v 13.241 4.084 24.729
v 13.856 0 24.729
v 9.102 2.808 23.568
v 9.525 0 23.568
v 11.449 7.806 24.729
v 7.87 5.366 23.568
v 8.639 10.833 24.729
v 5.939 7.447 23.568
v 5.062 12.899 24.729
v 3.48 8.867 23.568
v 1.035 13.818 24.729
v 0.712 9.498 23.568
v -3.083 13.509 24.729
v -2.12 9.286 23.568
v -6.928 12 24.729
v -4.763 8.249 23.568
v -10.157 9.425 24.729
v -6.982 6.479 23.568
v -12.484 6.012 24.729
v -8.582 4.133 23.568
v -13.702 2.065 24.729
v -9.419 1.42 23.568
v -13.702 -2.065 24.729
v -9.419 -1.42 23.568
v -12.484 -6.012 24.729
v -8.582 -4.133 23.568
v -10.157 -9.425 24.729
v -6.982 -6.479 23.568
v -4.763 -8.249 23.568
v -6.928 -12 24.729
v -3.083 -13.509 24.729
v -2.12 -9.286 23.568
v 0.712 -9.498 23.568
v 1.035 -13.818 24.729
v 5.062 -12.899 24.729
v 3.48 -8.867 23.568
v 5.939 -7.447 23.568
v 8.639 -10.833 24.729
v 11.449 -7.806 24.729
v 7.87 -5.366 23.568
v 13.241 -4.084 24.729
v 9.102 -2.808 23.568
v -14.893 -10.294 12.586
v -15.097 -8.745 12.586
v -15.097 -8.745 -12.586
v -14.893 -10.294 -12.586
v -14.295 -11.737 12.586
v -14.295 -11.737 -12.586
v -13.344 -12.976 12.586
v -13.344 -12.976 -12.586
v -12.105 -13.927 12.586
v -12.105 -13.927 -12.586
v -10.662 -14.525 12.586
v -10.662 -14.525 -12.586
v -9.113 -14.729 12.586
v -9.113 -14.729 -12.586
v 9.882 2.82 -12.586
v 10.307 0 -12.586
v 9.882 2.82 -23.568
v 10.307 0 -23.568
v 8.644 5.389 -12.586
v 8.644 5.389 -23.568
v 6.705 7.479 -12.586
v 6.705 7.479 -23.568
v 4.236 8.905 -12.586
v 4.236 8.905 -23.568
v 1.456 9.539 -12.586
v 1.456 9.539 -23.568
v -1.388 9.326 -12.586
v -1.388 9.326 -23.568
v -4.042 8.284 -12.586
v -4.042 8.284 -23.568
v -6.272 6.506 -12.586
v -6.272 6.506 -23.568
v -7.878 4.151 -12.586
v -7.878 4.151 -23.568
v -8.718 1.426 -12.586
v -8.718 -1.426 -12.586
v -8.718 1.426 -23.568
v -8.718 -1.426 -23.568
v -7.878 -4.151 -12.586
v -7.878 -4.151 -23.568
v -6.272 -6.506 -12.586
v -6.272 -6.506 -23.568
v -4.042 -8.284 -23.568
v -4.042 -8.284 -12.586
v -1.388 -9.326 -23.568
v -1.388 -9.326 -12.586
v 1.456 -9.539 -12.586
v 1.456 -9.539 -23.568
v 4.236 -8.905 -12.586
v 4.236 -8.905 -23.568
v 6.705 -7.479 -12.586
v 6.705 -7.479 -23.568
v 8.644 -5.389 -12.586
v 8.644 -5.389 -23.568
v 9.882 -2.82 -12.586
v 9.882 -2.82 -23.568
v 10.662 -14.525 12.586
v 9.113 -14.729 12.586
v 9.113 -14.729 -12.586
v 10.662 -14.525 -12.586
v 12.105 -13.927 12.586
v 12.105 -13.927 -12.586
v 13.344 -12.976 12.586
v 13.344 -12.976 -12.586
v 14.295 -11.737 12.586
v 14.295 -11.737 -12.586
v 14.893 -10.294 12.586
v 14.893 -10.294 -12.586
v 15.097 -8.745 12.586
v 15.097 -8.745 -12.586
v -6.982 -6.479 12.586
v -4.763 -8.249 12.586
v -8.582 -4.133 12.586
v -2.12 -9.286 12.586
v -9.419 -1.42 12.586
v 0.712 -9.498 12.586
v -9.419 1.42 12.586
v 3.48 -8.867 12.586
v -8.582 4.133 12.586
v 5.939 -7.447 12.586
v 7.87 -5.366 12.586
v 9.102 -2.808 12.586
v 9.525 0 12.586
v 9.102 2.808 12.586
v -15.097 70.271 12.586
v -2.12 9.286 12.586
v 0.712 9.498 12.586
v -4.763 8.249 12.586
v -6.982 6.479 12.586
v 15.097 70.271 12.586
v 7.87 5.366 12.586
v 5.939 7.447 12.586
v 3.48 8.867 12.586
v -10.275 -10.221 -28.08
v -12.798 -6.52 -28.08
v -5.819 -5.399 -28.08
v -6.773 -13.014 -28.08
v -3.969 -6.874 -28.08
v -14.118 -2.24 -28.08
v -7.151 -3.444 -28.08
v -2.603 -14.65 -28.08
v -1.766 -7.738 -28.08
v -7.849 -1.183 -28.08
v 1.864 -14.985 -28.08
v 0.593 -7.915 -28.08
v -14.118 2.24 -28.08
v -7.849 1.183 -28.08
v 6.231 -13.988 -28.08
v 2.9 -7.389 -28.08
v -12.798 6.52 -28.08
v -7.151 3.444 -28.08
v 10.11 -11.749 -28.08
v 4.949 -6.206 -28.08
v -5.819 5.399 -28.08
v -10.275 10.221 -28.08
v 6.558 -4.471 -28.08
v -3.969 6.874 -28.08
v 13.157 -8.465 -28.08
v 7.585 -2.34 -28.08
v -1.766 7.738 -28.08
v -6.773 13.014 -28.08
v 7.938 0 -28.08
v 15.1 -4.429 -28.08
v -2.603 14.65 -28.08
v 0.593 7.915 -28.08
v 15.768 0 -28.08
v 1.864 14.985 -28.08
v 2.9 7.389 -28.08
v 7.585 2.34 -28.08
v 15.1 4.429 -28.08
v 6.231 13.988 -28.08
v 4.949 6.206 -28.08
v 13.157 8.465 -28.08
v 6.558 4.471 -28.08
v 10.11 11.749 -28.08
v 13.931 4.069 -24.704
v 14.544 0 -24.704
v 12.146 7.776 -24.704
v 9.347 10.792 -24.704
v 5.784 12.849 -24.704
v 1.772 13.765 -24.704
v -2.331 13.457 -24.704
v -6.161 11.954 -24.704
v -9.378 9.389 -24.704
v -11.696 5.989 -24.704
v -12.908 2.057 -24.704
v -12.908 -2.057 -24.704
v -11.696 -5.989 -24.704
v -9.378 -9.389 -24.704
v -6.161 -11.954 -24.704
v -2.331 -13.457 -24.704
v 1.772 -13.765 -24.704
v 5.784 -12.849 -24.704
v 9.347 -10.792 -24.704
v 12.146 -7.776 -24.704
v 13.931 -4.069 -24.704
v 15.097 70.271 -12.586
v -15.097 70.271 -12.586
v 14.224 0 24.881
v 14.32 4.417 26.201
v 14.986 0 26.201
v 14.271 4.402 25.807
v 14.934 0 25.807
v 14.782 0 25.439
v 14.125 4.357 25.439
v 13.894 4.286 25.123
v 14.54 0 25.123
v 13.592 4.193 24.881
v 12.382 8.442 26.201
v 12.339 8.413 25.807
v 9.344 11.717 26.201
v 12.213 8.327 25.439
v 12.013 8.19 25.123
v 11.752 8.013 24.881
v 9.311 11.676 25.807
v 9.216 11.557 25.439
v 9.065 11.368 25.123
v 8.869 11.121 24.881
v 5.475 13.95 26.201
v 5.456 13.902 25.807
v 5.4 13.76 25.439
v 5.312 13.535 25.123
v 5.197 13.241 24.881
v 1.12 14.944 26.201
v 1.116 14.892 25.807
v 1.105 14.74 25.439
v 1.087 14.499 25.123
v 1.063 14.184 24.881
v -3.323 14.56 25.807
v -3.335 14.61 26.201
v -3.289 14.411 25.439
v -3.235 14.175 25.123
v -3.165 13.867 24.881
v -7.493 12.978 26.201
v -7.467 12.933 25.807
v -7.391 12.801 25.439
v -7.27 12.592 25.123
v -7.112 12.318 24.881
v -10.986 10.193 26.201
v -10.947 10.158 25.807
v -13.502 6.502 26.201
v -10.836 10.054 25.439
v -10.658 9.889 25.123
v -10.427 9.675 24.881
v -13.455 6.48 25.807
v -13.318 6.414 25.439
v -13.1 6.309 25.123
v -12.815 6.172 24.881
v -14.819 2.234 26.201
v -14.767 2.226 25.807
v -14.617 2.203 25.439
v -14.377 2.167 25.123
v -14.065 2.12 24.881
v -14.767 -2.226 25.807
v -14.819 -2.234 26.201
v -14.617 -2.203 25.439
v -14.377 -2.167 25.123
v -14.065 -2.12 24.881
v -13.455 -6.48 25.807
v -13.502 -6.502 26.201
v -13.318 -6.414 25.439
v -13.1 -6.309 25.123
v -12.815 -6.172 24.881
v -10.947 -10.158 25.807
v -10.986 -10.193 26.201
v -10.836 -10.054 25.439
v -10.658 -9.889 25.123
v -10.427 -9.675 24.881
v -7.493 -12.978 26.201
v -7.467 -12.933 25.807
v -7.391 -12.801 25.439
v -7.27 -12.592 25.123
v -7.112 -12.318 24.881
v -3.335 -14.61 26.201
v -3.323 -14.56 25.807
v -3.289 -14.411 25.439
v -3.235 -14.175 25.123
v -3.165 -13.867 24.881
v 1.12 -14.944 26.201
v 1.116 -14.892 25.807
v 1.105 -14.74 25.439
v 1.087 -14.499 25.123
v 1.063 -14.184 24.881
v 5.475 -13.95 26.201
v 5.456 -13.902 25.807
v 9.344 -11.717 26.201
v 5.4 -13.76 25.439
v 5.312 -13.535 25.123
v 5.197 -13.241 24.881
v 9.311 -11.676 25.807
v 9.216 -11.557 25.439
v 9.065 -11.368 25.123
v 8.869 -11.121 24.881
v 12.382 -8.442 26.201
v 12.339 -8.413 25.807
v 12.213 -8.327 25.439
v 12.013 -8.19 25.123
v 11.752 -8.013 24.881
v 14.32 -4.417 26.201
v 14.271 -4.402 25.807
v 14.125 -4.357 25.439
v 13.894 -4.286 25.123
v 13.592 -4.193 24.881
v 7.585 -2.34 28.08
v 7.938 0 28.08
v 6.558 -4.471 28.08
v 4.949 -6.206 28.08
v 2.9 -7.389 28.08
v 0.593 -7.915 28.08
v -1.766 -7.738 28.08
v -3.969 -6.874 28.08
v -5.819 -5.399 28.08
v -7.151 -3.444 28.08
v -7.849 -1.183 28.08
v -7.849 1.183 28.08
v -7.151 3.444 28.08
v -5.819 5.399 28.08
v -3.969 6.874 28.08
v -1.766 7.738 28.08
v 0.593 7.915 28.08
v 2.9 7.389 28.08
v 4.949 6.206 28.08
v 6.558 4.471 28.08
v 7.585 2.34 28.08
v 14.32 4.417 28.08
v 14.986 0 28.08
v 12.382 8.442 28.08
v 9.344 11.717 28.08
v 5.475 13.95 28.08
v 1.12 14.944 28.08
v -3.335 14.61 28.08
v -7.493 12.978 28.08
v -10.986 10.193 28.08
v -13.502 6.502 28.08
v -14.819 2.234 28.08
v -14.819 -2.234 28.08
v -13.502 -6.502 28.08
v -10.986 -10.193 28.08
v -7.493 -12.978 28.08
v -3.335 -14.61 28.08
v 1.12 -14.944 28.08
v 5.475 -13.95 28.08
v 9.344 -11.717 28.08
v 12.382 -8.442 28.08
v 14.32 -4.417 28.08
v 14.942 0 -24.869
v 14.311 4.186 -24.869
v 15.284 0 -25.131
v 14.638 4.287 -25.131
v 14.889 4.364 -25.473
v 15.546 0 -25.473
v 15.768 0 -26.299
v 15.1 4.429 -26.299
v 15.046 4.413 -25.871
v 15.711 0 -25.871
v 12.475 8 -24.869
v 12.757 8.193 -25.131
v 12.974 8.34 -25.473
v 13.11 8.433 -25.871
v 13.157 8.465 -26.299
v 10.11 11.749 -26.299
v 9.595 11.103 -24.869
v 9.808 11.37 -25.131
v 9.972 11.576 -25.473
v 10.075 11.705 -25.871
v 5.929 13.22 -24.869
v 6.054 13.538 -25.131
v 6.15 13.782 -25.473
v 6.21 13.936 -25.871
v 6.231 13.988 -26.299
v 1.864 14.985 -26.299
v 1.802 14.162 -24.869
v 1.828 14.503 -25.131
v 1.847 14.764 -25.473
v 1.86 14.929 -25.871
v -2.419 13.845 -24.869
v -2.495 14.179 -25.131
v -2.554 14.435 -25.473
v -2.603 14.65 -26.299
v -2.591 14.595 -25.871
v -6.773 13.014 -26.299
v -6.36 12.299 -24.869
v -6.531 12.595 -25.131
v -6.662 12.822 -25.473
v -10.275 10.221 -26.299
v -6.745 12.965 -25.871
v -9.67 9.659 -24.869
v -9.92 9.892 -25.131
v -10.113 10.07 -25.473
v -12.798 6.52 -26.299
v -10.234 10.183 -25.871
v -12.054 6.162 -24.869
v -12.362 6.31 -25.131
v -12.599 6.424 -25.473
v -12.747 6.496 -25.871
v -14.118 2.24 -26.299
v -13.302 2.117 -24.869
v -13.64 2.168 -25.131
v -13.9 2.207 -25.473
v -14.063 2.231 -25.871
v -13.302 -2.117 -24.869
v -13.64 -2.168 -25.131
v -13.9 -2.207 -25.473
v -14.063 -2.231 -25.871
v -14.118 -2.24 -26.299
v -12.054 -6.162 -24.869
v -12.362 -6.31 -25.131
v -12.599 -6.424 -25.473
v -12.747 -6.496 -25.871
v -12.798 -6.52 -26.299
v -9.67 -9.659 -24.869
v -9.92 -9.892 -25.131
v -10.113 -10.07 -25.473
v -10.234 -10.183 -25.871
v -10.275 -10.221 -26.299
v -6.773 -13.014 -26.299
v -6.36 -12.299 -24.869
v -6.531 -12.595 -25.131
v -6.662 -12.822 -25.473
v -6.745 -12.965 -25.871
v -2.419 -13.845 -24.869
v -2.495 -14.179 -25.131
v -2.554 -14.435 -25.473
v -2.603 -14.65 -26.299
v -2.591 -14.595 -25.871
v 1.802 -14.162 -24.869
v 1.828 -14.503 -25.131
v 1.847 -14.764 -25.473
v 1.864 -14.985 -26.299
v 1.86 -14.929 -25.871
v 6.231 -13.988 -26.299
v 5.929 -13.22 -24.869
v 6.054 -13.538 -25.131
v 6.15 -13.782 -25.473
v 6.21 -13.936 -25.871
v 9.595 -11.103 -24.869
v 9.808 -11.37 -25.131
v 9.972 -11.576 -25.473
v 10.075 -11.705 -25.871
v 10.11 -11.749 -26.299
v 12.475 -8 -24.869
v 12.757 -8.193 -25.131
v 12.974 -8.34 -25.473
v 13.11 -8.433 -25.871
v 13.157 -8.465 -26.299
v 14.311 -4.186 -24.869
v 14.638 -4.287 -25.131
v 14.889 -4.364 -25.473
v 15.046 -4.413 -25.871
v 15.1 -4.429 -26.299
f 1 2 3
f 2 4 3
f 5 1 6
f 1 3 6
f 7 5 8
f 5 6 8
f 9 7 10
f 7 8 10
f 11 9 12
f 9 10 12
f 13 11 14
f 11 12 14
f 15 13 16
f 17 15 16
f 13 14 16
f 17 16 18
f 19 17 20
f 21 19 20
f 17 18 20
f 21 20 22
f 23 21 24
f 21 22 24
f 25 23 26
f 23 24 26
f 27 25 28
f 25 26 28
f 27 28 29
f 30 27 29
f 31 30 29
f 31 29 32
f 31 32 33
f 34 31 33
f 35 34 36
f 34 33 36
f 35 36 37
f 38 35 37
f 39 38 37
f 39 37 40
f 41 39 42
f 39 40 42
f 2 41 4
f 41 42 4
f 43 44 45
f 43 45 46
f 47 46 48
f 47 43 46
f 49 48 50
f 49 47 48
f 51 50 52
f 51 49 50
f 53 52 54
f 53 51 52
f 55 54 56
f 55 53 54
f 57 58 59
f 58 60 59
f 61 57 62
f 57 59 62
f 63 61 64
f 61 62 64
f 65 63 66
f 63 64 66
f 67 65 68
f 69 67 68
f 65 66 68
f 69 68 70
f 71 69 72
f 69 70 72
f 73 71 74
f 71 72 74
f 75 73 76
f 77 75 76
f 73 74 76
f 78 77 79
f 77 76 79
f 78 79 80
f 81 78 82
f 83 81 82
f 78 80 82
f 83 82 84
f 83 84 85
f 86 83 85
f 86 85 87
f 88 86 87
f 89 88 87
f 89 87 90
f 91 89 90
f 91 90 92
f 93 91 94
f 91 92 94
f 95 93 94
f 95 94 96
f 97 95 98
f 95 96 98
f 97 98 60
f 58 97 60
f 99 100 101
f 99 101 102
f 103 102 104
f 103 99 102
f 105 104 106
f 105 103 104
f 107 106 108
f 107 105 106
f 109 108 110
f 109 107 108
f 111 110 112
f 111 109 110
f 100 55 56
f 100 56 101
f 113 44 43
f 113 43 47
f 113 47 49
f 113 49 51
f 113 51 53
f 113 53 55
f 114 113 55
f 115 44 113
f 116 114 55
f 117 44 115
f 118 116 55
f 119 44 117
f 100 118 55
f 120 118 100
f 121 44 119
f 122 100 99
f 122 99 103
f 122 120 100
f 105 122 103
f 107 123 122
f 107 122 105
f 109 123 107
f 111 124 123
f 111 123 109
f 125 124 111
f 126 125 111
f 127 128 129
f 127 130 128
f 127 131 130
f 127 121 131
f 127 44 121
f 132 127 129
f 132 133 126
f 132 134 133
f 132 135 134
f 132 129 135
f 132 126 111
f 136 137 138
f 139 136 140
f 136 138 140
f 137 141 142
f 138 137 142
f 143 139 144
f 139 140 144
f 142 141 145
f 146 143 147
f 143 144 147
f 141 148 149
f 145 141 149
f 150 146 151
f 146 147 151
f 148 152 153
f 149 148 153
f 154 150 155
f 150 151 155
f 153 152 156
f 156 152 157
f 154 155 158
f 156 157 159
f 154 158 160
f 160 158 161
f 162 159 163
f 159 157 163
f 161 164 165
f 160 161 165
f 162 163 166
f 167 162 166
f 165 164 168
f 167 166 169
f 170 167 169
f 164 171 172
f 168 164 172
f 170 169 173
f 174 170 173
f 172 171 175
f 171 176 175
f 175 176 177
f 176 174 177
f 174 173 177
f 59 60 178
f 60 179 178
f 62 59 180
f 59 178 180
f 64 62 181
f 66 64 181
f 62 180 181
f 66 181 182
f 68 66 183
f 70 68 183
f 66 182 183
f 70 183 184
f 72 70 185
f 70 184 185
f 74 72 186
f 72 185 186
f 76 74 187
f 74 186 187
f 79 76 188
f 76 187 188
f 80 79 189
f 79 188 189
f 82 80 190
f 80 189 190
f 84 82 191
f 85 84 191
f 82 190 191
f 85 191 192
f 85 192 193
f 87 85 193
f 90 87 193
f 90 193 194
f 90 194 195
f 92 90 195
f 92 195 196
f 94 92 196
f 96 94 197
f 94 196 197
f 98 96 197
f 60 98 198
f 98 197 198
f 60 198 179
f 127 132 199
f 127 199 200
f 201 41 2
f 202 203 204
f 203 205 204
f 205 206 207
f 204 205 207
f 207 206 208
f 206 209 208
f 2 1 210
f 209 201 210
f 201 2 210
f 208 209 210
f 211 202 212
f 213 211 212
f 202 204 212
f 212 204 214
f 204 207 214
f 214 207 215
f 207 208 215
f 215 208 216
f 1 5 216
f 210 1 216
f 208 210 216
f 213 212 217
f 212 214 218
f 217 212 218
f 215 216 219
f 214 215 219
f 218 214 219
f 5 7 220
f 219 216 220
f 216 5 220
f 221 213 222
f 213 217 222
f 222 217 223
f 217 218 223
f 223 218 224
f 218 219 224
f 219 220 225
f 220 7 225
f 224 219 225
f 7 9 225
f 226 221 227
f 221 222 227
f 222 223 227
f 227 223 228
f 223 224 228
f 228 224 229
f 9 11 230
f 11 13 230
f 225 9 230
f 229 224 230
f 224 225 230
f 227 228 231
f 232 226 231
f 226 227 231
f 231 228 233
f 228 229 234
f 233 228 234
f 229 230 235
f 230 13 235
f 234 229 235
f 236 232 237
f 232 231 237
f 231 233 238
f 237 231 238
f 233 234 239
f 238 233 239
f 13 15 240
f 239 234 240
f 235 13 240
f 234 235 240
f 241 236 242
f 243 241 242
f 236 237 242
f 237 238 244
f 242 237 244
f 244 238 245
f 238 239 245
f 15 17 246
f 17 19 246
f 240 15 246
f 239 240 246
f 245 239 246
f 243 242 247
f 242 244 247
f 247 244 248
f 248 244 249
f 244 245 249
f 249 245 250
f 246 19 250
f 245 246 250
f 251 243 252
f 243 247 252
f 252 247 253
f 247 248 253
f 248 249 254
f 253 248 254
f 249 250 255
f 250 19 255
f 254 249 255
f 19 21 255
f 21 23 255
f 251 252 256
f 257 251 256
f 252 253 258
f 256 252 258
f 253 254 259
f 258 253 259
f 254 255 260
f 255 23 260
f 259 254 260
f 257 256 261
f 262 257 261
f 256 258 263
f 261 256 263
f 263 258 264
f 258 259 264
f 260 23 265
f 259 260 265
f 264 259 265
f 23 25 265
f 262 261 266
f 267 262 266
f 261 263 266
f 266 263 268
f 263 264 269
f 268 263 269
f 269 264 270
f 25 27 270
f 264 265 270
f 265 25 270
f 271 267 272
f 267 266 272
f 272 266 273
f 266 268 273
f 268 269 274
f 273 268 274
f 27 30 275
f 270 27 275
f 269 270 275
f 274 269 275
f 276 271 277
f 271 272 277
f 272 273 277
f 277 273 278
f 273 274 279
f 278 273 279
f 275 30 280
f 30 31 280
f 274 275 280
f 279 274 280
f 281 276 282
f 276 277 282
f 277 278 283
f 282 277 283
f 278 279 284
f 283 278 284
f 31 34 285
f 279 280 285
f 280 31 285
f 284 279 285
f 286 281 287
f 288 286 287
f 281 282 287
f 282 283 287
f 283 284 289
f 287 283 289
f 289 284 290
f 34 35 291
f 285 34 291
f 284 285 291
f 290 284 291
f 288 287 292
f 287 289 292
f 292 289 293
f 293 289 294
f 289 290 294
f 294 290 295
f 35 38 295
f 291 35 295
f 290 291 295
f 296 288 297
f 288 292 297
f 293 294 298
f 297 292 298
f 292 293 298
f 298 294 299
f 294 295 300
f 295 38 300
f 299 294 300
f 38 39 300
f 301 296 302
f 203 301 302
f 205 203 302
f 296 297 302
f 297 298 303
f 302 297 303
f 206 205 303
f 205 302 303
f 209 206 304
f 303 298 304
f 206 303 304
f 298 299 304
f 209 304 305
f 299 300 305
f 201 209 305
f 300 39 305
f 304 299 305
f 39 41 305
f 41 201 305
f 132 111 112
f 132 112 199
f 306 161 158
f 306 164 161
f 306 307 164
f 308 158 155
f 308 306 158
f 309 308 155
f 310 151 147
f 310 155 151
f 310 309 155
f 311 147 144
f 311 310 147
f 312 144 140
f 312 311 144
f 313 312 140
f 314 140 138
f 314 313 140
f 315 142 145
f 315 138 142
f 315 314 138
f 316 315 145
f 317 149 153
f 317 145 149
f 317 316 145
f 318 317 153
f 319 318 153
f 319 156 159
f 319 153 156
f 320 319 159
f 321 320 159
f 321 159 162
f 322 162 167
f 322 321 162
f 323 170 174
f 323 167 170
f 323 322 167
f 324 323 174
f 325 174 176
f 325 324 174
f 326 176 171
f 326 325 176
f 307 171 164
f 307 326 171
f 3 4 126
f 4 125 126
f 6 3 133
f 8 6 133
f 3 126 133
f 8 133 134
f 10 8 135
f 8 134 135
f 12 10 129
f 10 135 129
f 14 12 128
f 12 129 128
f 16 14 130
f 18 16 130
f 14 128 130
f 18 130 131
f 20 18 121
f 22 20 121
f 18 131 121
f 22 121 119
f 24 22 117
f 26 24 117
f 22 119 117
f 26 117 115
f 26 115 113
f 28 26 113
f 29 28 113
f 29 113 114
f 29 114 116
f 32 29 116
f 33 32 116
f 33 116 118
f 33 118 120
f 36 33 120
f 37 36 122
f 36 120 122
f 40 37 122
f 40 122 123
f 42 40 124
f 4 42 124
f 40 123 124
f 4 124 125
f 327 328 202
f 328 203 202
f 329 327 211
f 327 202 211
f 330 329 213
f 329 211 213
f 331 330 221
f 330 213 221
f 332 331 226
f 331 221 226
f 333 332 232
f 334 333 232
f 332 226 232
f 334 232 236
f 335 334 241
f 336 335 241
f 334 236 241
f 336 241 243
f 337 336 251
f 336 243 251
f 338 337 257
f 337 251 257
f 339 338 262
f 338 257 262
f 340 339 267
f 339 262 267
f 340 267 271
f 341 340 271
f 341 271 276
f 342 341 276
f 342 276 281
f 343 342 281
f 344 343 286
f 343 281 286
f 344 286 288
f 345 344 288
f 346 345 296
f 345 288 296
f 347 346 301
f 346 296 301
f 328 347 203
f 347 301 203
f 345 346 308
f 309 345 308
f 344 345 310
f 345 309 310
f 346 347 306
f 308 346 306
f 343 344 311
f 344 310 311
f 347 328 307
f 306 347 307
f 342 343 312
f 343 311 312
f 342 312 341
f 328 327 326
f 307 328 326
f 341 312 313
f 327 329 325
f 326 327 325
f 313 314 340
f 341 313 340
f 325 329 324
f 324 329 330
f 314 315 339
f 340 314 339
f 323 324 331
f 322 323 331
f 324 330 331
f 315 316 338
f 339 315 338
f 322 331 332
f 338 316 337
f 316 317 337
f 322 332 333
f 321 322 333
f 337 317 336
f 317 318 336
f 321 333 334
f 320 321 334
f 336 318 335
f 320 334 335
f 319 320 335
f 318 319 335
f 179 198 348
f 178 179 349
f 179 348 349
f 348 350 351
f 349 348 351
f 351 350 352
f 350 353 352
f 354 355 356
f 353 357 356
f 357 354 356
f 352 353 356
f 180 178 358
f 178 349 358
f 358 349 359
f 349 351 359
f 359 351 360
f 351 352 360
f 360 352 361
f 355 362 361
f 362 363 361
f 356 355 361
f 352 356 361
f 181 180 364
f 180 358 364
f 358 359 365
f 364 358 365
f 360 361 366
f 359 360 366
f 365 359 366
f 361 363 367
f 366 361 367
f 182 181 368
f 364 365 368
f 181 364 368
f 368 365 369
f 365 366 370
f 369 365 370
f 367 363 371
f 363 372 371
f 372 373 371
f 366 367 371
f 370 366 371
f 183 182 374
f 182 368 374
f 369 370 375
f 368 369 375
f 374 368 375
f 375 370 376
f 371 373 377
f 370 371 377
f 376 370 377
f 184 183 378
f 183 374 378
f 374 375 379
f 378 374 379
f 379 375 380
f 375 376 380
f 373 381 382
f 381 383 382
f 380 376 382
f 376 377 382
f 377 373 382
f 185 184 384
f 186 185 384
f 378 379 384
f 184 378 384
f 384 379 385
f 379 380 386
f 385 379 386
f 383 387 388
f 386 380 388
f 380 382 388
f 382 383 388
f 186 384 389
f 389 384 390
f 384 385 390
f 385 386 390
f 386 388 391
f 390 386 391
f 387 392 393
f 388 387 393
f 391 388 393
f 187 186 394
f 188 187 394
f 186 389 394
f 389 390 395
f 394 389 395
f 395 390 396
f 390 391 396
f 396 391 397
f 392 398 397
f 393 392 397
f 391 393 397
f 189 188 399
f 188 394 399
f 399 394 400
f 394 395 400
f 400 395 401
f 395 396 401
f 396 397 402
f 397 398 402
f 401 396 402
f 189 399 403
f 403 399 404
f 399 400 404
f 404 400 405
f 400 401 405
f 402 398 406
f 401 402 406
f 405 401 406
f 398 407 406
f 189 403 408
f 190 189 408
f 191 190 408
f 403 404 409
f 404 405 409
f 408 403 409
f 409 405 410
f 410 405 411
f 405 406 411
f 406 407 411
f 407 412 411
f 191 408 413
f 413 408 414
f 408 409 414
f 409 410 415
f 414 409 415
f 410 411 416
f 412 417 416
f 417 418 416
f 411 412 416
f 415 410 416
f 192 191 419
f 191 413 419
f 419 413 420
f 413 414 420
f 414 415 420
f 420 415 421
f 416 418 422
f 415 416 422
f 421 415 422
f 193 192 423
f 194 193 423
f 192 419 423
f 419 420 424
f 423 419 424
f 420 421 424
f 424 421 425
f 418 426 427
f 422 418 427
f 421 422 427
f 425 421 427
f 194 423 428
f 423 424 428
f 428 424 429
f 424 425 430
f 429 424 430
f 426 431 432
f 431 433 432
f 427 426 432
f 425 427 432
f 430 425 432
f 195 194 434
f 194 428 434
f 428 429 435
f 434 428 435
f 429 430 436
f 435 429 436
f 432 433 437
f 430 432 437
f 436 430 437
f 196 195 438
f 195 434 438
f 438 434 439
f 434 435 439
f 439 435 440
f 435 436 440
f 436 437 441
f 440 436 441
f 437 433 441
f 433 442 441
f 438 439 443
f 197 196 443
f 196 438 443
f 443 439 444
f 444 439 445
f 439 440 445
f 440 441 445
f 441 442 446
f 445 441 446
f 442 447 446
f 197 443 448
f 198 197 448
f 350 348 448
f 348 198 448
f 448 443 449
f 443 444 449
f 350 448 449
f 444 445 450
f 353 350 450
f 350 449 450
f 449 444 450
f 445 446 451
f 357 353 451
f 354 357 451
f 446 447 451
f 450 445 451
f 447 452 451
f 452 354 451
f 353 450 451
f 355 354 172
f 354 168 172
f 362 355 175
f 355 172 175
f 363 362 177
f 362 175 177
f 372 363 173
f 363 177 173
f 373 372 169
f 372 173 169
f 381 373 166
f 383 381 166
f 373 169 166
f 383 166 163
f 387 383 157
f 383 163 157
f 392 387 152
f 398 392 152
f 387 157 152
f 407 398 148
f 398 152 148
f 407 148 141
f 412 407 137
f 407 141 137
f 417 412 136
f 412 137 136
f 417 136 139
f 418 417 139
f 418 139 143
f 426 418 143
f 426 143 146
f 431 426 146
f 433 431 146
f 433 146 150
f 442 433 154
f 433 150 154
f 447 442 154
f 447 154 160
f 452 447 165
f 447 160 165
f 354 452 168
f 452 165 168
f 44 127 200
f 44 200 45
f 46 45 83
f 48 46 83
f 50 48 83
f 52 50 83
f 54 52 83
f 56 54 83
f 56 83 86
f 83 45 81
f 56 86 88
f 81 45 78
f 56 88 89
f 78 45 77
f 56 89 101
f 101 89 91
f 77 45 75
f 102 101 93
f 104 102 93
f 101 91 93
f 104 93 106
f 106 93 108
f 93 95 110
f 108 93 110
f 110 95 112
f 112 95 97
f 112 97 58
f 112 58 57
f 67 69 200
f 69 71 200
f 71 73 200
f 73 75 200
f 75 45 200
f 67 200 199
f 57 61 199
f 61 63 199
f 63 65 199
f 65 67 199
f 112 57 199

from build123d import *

# Parameters (mm, degrees)
BOSS_EXTRUDE1_DEPTH = 25.1714


with BuildPart() as part:
    # Sketch1 → Boss-Extrude1 (new body)
    with BuildSketch(Plane.XY.offset(12.5857)):
        with BuildLine():
            Line((-15.096819971, 70.27139515), (-15.096819971, -8.74510913))
            ThreePointArc((-15.096819971, -8.74510913), (-13.34429465, -12.976079529), (-9.113324251, -14.72860485))
            Line((-9.113324251, -14.72860485), (9.113324251, -14.72860485))
            ThreePointArc((9.113324251, -14.72860485), (13.34429465, -12.976079529), (15.096819971, -8.74510913))
            Line((15.096819971, -8.74510913), (15.096819971, 70.27139515))
            Line((15.096819971, 70.27139515), (-15.096819971, 70.27139515))
        make_face()
    extrude(amount=-BOSS_EXTRUDE1_DEPTH)

    # Sketch2 → Revolve1 (revolve)
    with BuildSketch(Plane(origin=(0, 0, 0), x_dir=(1, 0, 0), z_dir=(0, 1, 0))):
        with BuildLine():
            Line((15.767676296, 28.0797), (0.740743286, 28.0797))
            Line((0.740743286, 28.0797), (0.740743286, 12.5857))
            Line((0.740743286, 12.5857), (10.306676296, 12.5857))
            Line((10.306676296, 12.5857), (10.306676296, 23.56842946))
            Line((10.306676296, 23.56842946), (14.543986539, 24.703813318))
            ThreePointArc((14.543986539, 24.703813318), (15.426502661, 25.293491738), (15.767676296, 26.298556857))
            Line((15.767676296, 26.298556857), (15.767676296, 28.0797))
        make_face()
    revolve(axis=Axis((0.740743286, 0, -28.0797), (0, 0, 1)))

    # Sketch3 → Revolve2 (revolve)
    with BuildSketch(Plane(origin=(0, 0, 0), x_dir=(1, 0, 0), z_dir=(0, 1, 0))):
        with BuildLine():
            Line((9.525, -12.5857), (0, -12.5857))
            Line((0, -12.5857), (0, -28.0797))
            Line((0, -28.0797), (14.986, -28.0797))
            Line((14.986, -28.0797), (14.986, -26.20110633))
            ThreePointArc((14.986, -26.20110633), (14.671070491, -25.273353912), (13.856440225, -24.72903537))
            Line((13.856440225, -24.72903537), (9.525, -23.56842946))
            Line((9.525, -23.56842946), (9.525, -12.5857))
        make_face()
    revolve(axis=Axis((0, 0, 3.0607), (0, 0, 1)))

    # Sketch4 → Cut-Revolve1 (revolve, cut)
    with BuildSketch(Plane.XZ):
        Polygon((8.636, 37.6047), (0, 37.6047), (0, -37.6047), (8.636, -37.6047), (8.636, -35.0647), (7.9375, -35.0647), (7.9375, 35.0647), (8.636, 35.0647), align=None)
    revolve(axis=Axis((0, 0, 37.6047), (0, 0, -1)), mode=Mode.SUBTRACT)


solid = part.part
